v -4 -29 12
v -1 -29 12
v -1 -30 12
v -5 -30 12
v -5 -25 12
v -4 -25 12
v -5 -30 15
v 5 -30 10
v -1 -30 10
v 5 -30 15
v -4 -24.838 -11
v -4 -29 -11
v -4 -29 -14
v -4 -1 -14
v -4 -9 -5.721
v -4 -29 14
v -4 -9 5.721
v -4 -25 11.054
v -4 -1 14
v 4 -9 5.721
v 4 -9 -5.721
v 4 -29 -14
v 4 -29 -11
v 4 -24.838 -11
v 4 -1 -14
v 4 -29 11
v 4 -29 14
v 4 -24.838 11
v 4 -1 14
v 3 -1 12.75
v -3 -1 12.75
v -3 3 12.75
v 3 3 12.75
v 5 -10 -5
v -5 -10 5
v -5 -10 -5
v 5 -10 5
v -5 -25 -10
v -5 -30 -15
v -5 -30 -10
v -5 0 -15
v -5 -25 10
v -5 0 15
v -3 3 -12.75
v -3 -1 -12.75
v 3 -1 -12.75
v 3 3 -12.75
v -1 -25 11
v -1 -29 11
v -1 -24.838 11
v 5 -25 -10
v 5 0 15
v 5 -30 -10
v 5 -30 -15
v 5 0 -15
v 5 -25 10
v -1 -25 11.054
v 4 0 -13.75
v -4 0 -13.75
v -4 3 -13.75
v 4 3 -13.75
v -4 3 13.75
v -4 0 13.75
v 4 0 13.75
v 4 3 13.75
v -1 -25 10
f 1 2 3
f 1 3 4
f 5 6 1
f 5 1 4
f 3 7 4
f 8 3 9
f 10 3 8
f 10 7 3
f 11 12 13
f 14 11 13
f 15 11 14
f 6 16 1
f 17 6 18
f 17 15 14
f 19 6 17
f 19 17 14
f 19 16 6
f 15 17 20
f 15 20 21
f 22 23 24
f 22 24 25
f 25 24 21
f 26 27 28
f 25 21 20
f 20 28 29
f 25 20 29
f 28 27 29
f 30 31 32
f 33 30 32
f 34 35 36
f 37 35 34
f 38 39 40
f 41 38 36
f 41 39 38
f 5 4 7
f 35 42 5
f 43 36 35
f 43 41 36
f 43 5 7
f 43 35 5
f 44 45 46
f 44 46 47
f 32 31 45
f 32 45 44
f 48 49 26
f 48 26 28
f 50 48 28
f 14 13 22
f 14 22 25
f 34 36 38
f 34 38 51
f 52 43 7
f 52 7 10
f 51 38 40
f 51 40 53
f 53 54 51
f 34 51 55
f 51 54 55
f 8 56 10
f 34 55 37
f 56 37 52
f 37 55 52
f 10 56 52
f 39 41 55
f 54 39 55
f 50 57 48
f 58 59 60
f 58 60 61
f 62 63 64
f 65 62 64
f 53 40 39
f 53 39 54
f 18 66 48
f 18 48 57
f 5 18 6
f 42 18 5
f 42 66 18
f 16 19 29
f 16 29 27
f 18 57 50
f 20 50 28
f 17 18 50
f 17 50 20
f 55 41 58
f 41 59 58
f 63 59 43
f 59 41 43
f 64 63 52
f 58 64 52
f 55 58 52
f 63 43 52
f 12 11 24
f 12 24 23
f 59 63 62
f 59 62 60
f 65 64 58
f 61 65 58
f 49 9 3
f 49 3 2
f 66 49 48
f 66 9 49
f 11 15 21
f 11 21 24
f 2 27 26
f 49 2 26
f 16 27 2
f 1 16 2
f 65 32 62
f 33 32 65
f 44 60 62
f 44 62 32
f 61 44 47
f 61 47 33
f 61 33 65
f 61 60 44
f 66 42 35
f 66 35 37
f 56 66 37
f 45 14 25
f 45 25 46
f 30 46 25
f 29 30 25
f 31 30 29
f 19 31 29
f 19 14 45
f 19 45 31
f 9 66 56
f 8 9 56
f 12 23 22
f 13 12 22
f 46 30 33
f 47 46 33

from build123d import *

# Parameters (mm, degrees)
SKETCH1_W           = 8
SKETCH1_H           = 27.5
BOSS_EXTRUDE1_DEPTH = 3
SKETCH2_W           = 10
SKETCH2_H           = 30
BOSS_EXTRUDE2_DEPTH = 10
SKETCH4_W           = 10
SKETCH4_H           = 5
BOSS_EXTRUDE3_DEPTH = 20
CHAMFER2_SIZE       = 5
CHAMFER2_SIZE2      = 15
SKETCH7_W           = 4
SKETCH7_H           = 5
CUT_EXTRUDE2_DEPTH  = 2
SHELL1_START        = -4
SHELL1_DEPTH        = 8
SHELL1_START_2      = -3
SHELL1_2_OUTLINE_W  = 4
SHELL1_2_OUTLINE_H  = 25.5
SHELL1_2_DEPTH      = 6
SHELL1_START_3      = -1
SHELL1_3_DEPTH      = 5


# Read off the part's stored shape, not the designer's step: Shell1
with BuildPart() as part:
    # Sketch1 → Boss-Extrude1 (new body)
    with BuildSketch(Plane(origin=(0, 0, 0), x_dir=(1, 0, 0), z_dir=(0, 1, 0))):
        Rectangle(SKETCH1_W, SKETCH1_H)
    extrude(amount=BOSS_EXTRUDE1_DEPTH)

    # Sketch2 → Boss-Extrude2 (add)
    with BuildSketch(Plane.XZ):
        Rectangle(SKETCH2_W, SKETCH2_H)
    extrude(amount=BOSS_EXTRUDE2_DEPTH)

    # Sketch4 → Boss-Extrude3 (add)
    with BuildSketch(Plane.XZ.offset(10)):
        with Locations((0, 12.5)):
            Rectangle(SKETCH4_W, SKETCH4_H)
        with Locations((0, -12.5)):
            Rectangle(SKETCH4_W, SKETCH4_H)
    extrude(amount=BOSS_EXTRUDE3_DEPTH)

    # Chamfer2
    chamfer2_edges = [part.edges().sort_by_distance(p)[0] for p in [
        (0, -10, 10),
        (0, -10, -10),
    ]]
    chamfer2_side = [part.faces().sort_by_distance(p)[0] for p in [
        (0, -10, 0),
    ]]
    chamfer(chamfer2_edges, length=CHAMFER2_SIZE, length2=CHAMFER2_SIZE2, reference=chamfer2_side[0])

    # Sketch7 → Cut-Extrude2 (cut)
    with BuildSketch(Plane(origin=(0, 0, 10), x_dir=(-1, 0, 0), z_dir=(0, 0, -1))):
        with Locations((3, -27.5)):
            Rectangle(SKETCH7_W, SKETCH7_H)
    extrude(amount=-CUT_EXTRUDE2_DEPTH, mode=Mode.SUBTRACT)

    # Shell1 outline → Shell1 (cut)
    with BuildSketch(Plane.YZ.offset(SHELL1_START)):
        Polygon((-9, 5.72075922), (-9, -5.72075922), (-24.83772234, -11), (-29, -11), (-29, -14), (-1, -14), (-1, 14), (-29, 14), (-29, 11), (-25, 11), (-25, 11.054092553), align=None)
    extrude(amount=SHELL1_DEPTH, mode=Mode.SUBTRACT)

    # Shell1 2 outline → Shell1 2 (cut)
    with BuildSketch(Plane.YZ.offset(SHELL1_START_2)):
        with Locations((1, 0)):
            Rectangle(SHELL1_2_OUTLINE_W, SHELL1_2_OUTLINE_H)
    extrude(amount=SHELL1_2_DEPTH, mode=Mode.SUBTRACT)

    # Shell1 3 outline → Shell1 3 (cut)
    with BuildSketch(Plane.YZ.offset(SHELL1_START_3)):
        Polygon((-25, 11), (-24.83772234, 11), (-25, 11.054092553), align=None)
    extrude(amount=SHELL1_3_DEPTH, mode=Mode.SUBTRACT)


solid = part.part
